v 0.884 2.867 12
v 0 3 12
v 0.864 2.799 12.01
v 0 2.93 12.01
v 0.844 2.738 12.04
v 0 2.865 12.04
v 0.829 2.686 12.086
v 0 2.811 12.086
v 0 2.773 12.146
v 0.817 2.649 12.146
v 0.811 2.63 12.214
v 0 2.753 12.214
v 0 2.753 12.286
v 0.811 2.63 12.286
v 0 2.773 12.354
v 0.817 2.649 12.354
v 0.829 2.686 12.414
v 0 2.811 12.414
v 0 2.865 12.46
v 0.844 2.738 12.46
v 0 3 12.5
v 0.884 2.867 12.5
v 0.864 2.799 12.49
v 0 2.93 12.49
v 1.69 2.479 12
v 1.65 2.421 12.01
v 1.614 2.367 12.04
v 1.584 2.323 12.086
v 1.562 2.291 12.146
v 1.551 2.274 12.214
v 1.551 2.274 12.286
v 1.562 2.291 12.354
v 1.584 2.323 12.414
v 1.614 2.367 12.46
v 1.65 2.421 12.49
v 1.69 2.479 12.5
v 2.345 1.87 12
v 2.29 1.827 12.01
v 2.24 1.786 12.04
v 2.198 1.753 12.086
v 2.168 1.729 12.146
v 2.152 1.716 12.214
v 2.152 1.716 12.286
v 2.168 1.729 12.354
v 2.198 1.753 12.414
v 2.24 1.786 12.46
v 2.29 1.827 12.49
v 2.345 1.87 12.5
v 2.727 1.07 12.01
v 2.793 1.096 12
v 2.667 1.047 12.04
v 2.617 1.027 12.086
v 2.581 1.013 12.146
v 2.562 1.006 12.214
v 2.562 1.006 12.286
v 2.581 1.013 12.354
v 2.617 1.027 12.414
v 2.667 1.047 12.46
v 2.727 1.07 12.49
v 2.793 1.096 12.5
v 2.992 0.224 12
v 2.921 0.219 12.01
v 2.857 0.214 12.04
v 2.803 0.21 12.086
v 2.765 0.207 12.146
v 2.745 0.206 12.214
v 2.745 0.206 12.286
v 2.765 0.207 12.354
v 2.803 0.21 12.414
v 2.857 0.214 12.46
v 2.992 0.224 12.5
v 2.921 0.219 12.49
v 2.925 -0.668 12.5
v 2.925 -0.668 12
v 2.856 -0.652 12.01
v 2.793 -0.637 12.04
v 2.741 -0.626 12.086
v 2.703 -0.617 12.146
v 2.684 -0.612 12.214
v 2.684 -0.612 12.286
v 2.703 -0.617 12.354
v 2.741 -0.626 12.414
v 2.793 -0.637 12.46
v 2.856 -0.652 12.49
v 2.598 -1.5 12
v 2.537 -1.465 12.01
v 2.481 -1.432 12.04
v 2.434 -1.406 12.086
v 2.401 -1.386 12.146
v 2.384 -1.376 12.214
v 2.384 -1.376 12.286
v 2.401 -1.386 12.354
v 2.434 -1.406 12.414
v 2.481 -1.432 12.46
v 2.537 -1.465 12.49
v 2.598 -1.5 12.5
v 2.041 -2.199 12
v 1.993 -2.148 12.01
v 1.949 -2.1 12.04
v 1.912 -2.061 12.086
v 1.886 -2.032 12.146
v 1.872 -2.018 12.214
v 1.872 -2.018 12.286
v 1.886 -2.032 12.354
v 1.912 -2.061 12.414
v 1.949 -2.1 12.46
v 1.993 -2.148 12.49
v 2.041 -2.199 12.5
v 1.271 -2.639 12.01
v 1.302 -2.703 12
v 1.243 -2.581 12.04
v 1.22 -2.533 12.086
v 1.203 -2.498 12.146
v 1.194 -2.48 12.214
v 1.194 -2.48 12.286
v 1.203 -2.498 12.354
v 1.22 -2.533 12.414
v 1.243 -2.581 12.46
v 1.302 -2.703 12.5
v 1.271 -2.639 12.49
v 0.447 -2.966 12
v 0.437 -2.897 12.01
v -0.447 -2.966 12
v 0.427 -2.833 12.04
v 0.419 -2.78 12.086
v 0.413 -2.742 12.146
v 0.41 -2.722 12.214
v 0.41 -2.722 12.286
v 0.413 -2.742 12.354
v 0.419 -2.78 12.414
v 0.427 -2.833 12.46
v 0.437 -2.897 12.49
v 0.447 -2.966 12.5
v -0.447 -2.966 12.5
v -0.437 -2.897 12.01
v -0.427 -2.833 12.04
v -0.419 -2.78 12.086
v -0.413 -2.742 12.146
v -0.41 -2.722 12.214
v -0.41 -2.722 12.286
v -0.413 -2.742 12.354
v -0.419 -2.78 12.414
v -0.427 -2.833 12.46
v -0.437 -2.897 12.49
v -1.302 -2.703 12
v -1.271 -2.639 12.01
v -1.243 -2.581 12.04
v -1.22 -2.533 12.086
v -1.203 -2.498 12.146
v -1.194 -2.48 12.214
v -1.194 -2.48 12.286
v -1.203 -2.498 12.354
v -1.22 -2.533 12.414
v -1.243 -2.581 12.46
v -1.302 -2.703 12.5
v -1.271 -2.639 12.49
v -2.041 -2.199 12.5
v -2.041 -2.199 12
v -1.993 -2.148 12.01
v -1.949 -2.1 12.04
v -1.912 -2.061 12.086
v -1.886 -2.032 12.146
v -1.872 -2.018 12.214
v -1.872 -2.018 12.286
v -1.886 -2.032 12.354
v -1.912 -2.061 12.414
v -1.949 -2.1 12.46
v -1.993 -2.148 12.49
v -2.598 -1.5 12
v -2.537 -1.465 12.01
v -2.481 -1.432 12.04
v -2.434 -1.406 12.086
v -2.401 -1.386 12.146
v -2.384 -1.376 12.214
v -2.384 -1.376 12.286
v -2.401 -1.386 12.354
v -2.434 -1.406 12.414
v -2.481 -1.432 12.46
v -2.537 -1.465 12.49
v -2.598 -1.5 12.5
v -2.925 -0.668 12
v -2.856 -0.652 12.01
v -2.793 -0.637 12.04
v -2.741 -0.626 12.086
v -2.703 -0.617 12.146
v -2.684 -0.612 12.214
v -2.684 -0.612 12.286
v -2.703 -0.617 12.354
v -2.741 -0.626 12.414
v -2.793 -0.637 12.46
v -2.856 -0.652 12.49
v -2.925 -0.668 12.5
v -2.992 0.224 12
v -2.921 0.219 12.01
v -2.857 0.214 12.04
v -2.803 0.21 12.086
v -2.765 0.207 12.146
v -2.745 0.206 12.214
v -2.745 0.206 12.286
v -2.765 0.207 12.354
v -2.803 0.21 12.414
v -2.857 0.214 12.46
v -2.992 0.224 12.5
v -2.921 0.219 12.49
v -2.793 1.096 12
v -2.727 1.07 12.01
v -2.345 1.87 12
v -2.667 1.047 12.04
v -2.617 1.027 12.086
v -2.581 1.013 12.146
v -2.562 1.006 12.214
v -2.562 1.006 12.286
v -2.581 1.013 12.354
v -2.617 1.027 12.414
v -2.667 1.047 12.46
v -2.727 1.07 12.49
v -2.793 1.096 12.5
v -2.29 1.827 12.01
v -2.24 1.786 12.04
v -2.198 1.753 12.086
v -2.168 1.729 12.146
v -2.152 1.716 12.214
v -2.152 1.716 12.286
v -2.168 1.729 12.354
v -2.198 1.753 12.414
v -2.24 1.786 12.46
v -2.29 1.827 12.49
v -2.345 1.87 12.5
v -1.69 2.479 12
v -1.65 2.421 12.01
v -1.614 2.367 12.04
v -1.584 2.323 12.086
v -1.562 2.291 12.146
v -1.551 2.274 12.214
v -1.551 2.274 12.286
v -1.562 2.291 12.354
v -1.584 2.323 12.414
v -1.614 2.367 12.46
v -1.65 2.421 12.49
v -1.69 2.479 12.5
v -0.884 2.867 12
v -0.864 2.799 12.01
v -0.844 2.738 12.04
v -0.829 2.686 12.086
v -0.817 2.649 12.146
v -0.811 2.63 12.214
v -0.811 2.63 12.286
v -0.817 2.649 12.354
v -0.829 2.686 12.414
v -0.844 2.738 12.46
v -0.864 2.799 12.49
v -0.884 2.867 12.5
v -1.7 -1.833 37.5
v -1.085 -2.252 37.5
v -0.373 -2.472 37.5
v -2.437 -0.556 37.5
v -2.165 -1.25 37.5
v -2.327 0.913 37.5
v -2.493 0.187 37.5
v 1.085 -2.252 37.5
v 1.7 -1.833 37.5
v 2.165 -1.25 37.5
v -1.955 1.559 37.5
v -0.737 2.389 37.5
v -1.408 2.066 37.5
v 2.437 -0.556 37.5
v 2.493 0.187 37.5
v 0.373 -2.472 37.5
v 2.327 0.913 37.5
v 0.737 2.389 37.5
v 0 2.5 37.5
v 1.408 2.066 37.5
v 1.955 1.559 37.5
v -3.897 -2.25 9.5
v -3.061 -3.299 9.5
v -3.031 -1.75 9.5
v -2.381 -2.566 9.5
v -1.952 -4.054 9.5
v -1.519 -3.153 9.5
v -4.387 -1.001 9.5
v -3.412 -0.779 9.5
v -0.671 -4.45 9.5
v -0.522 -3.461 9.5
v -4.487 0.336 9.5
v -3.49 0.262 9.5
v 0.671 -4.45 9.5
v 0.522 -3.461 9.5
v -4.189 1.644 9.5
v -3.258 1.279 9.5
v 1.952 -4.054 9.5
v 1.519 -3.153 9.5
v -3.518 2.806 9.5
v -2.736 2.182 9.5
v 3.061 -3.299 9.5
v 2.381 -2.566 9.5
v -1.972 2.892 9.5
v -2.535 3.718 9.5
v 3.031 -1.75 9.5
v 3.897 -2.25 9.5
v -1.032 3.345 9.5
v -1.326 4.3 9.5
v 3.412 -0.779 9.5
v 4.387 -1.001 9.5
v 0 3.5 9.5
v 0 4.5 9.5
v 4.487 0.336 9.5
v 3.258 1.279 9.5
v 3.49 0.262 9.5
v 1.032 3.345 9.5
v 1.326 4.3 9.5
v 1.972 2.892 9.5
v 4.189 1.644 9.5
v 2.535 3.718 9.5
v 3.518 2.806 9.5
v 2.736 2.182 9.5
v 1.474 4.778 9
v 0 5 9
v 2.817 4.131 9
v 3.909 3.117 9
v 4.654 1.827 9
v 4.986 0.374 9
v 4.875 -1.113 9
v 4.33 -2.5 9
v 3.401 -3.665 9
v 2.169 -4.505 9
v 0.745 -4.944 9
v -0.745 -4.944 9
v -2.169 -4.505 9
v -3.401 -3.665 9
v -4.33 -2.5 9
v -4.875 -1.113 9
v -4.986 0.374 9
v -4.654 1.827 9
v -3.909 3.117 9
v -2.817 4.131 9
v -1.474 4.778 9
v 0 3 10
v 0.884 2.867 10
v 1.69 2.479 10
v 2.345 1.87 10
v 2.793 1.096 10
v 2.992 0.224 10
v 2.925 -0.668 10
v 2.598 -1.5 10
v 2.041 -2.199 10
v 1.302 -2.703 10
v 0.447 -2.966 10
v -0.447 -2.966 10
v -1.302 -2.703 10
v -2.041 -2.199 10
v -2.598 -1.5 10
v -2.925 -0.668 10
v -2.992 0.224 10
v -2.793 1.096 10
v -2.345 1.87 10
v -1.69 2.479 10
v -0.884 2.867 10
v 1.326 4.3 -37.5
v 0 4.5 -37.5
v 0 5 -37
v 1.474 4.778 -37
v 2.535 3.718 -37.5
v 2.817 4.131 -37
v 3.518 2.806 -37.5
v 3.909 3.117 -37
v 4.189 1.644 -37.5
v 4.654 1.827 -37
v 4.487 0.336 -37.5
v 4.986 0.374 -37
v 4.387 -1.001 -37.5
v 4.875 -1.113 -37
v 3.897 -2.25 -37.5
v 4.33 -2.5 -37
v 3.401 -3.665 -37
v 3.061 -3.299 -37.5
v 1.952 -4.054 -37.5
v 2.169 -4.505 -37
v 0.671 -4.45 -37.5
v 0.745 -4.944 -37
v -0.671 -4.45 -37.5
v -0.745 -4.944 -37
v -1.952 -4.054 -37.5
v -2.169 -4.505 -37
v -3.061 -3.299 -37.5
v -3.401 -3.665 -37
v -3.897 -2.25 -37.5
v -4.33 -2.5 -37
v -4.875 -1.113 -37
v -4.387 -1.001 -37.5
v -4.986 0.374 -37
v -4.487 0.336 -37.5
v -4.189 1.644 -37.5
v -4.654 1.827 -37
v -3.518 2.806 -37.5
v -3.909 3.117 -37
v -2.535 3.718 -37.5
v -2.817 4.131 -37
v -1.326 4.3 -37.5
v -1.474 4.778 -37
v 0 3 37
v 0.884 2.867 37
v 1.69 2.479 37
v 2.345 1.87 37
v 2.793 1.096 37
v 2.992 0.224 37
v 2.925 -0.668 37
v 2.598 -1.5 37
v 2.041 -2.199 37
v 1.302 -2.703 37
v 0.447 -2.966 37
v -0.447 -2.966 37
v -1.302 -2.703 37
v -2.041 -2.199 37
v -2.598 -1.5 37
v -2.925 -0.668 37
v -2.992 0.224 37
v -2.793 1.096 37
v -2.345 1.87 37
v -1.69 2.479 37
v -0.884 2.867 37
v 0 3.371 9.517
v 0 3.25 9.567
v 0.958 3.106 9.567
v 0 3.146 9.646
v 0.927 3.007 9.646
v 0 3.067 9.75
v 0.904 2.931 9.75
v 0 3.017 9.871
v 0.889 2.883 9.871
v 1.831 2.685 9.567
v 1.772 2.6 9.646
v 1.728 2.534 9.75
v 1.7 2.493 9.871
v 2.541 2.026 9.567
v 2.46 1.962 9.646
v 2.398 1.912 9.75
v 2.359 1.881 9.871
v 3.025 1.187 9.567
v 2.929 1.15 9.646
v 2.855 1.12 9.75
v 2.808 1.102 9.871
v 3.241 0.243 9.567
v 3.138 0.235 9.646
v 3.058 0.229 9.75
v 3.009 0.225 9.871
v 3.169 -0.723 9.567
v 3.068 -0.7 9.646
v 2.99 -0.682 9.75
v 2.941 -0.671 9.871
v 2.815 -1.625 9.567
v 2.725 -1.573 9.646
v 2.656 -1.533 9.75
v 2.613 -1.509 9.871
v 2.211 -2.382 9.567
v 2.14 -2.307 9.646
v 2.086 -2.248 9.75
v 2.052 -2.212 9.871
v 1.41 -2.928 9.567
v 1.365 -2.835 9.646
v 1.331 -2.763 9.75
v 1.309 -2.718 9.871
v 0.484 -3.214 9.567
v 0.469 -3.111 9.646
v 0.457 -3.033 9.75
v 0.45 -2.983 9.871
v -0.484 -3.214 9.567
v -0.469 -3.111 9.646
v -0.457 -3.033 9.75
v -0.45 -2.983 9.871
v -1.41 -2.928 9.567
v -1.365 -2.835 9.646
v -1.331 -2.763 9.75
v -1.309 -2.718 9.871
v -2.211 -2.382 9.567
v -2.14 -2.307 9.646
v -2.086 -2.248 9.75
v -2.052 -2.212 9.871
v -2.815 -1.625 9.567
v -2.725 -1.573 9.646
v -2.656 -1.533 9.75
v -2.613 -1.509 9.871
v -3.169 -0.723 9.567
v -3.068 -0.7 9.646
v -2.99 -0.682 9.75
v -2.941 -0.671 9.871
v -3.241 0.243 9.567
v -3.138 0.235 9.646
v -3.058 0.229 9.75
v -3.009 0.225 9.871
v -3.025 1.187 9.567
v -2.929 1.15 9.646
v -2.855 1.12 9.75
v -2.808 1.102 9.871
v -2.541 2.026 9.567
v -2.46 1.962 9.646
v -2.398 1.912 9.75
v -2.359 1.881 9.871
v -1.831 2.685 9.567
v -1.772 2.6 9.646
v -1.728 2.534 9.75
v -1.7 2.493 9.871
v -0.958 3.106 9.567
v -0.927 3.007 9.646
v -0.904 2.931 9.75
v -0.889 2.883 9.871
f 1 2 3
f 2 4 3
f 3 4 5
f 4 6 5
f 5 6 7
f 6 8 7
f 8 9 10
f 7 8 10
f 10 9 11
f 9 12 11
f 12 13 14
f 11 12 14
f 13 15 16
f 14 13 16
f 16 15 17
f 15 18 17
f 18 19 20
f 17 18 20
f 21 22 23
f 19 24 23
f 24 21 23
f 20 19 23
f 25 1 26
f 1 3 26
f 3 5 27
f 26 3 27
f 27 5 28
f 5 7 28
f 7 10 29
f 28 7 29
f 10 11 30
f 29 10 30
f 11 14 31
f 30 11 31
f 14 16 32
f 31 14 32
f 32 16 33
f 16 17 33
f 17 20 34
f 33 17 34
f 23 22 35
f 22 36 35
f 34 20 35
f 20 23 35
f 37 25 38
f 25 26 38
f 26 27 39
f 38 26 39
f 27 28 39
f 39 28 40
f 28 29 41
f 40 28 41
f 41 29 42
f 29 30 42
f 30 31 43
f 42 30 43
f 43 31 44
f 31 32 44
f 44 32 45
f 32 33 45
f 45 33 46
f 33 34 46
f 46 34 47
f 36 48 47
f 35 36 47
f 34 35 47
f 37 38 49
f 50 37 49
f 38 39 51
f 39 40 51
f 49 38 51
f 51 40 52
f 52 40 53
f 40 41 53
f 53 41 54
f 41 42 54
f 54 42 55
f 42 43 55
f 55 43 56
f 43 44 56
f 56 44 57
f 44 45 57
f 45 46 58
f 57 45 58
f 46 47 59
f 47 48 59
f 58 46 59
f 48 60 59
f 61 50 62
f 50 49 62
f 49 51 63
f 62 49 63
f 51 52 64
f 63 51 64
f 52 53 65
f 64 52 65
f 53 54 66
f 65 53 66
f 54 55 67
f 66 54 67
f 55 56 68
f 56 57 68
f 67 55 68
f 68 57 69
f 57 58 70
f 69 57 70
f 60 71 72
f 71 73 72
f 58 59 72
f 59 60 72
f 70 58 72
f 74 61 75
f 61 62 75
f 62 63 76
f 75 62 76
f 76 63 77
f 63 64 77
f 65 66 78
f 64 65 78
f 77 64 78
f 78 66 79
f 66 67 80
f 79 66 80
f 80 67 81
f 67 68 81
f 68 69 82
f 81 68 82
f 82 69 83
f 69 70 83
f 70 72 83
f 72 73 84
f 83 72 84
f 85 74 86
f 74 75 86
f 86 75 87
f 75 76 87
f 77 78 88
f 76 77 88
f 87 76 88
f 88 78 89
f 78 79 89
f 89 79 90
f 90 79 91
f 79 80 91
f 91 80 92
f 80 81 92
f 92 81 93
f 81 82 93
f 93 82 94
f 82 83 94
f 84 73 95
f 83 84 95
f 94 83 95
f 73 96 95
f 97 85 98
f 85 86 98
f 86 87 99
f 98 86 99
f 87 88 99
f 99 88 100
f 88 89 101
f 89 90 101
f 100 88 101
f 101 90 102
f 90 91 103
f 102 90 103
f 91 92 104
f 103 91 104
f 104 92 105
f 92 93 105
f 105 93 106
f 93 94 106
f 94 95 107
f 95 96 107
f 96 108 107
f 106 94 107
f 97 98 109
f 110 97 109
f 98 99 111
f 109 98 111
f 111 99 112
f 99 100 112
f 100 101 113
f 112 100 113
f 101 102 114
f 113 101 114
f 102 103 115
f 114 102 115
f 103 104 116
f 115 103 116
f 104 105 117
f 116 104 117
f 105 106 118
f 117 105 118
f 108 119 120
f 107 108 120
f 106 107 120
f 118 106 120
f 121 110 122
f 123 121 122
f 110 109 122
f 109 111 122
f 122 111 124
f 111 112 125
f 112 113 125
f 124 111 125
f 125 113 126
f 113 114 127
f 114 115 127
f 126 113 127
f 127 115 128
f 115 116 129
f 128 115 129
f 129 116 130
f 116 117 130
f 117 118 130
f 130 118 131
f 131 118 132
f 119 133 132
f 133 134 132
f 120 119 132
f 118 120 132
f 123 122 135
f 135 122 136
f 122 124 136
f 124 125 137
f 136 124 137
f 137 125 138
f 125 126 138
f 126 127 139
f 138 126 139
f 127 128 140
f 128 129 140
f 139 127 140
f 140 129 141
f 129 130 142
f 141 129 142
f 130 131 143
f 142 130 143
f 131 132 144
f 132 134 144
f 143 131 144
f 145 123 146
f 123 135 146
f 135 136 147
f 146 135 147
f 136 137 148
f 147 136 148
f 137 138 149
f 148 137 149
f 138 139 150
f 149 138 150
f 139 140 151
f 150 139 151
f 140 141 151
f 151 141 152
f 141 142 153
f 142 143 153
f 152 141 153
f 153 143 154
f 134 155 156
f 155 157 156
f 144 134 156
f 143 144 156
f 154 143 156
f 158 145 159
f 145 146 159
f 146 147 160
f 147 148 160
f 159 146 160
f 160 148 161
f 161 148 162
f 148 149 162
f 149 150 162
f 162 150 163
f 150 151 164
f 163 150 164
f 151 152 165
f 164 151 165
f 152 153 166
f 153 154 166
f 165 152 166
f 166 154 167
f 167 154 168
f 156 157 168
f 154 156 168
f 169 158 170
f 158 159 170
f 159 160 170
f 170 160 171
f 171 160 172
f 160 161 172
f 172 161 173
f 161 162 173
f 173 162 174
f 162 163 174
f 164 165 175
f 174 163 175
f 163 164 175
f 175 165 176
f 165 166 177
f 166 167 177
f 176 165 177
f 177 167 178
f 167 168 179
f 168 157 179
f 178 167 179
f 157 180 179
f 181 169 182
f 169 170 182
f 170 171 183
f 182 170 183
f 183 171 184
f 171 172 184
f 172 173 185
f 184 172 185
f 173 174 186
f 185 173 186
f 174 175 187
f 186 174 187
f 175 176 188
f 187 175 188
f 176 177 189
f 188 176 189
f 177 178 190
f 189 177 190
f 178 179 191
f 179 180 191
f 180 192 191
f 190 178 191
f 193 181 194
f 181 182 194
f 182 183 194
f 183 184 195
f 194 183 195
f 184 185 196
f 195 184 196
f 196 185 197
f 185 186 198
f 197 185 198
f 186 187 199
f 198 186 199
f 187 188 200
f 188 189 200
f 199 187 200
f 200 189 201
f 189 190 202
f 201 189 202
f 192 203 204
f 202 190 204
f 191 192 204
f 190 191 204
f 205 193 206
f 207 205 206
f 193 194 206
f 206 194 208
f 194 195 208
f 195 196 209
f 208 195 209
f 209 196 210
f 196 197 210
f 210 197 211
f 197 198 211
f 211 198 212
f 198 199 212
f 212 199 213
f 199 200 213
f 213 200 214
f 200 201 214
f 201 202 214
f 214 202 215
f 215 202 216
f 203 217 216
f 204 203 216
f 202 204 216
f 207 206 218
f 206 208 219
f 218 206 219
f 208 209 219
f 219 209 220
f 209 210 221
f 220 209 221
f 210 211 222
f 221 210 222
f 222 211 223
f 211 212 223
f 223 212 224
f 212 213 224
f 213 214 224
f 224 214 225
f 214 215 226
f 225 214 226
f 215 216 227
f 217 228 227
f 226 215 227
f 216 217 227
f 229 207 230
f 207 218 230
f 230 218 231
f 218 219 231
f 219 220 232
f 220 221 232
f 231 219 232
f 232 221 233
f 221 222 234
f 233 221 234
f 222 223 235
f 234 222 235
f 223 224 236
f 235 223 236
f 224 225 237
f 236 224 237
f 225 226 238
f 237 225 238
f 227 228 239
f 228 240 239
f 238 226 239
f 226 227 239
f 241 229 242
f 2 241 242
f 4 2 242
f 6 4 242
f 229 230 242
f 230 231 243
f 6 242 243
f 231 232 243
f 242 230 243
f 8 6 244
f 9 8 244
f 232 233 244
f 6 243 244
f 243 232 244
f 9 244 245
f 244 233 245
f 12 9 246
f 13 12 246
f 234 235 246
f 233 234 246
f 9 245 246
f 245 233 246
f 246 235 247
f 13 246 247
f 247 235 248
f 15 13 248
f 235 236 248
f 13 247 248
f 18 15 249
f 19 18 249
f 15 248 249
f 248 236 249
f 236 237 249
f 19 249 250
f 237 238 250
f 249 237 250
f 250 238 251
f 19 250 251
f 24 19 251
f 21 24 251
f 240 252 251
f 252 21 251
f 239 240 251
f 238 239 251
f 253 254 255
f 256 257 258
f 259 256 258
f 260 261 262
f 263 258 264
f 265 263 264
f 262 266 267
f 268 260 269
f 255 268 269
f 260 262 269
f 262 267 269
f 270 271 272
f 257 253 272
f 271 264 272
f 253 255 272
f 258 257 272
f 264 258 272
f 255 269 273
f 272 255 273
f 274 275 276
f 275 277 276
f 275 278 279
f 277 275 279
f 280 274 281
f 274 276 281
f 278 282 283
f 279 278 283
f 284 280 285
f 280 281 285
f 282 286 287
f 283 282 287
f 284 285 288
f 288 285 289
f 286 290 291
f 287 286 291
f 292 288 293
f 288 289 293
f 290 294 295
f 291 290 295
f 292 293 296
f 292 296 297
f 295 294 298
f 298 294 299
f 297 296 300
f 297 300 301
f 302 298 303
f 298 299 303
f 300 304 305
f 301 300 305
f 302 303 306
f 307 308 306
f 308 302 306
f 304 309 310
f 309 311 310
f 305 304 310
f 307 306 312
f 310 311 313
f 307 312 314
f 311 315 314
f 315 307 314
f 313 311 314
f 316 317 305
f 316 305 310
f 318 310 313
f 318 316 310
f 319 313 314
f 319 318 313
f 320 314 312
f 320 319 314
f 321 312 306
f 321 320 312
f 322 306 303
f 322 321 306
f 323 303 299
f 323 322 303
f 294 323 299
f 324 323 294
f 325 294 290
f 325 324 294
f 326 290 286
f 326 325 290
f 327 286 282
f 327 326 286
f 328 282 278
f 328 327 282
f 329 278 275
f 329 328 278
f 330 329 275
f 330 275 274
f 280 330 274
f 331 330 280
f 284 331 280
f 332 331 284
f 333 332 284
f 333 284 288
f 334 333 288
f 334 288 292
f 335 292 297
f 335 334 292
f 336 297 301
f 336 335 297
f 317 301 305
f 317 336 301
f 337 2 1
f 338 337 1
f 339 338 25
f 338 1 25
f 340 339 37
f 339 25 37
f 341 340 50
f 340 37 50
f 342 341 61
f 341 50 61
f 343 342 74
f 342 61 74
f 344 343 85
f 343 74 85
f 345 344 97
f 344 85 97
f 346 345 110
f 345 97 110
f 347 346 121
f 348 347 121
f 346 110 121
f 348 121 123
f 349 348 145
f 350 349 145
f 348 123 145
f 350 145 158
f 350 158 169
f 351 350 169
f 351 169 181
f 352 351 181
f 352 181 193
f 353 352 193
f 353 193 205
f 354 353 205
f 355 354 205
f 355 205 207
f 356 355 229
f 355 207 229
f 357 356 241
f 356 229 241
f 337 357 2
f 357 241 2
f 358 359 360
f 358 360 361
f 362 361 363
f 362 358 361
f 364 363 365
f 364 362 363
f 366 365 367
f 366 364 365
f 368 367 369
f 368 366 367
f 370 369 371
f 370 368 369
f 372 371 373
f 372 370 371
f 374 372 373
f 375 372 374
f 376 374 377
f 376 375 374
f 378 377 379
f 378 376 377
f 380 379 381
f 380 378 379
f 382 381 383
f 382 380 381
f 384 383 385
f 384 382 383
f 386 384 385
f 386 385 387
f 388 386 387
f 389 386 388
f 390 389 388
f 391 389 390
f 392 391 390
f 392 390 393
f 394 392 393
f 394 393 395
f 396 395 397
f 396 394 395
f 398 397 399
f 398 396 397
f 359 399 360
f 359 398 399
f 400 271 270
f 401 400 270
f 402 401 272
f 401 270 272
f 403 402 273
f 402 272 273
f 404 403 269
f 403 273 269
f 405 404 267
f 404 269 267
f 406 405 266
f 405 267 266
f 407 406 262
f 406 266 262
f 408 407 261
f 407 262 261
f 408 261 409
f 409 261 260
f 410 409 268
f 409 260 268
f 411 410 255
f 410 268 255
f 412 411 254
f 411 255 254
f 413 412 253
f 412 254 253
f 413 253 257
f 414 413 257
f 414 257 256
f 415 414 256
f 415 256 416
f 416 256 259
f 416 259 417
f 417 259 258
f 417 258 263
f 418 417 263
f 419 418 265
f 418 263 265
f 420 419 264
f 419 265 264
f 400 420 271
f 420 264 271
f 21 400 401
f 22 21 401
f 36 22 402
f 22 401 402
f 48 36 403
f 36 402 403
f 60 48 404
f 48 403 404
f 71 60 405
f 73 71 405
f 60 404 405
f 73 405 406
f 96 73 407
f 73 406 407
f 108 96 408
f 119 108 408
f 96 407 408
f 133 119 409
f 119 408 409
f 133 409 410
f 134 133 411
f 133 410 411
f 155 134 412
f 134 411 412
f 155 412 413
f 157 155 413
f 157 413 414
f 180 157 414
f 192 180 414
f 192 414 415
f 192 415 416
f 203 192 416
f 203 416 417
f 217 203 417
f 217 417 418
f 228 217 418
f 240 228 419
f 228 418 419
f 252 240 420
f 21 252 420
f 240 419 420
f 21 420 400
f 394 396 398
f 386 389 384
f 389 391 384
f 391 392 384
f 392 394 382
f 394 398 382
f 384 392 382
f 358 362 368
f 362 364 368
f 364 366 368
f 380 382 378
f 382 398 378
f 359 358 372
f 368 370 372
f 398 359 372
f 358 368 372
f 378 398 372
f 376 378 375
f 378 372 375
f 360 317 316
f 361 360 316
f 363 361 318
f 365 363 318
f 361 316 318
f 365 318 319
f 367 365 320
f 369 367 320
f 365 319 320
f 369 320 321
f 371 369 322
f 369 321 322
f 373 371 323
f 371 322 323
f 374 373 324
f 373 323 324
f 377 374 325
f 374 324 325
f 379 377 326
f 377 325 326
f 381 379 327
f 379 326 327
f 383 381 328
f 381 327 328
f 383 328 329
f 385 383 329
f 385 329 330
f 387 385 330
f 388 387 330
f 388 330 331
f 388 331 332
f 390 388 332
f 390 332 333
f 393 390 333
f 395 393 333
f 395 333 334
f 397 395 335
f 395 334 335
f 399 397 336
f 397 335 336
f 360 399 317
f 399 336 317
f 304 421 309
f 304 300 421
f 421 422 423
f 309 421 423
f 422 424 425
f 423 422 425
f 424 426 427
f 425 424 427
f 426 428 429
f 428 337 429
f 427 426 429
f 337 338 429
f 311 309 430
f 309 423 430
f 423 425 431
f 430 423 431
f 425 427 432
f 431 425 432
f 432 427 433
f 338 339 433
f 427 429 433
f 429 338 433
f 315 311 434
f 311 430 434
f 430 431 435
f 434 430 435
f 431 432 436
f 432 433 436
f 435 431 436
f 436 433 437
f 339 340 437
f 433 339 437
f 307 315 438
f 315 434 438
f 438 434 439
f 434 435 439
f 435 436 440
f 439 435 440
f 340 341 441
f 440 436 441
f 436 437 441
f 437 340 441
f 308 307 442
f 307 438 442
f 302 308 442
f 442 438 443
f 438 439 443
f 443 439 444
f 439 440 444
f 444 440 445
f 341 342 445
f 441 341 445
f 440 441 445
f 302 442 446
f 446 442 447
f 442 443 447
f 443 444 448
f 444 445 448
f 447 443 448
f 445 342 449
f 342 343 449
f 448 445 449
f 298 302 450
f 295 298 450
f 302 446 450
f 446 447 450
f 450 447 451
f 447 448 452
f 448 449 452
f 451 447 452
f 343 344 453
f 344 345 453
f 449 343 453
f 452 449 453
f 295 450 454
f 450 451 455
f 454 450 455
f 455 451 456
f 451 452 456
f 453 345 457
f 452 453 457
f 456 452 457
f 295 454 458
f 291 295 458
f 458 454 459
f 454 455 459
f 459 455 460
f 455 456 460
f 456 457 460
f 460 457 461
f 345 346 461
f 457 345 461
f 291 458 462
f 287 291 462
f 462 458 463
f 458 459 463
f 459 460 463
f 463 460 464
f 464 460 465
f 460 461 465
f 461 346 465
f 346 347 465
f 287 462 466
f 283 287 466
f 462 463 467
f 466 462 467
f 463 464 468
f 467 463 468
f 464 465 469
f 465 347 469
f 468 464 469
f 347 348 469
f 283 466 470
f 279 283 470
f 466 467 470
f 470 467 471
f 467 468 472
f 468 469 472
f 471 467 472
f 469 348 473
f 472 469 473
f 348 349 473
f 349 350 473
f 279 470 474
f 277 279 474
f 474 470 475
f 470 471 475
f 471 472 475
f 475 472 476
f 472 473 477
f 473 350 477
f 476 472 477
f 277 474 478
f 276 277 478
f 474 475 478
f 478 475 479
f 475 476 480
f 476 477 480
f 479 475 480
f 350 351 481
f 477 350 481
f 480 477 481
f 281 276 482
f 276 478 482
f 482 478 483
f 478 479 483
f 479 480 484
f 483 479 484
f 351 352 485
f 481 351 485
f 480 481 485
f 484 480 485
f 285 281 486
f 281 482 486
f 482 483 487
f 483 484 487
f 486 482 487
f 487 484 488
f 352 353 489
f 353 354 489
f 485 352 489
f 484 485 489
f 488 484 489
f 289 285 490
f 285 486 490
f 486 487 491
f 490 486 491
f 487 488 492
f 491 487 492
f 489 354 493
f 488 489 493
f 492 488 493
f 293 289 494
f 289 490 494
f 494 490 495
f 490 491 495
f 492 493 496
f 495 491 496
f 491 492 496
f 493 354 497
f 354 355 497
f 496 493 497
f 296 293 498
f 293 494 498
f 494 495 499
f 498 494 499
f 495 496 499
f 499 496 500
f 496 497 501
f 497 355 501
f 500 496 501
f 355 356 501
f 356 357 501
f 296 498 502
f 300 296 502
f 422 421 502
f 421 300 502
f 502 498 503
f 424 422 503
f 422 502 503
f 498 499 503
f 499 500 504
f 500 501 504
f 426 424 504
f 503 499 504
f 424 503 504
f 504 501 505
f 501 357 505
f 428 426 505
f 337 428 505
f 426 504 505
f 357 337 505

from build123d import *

# Parameters (mm, degrees)
FILLET1_R     = 0.5
CHAMFER1_SIZE = 0.5


with BuildPart() as part:
    # Sketch1 → Revolve1 (revolve)
    with BuildSketch(Plane(origin=(0, 0, 0), x_dir=(0, 0, -1), z_dir=(1, 0, 0))):
        with BuildLine():
            Line((-37.5, 0), (37.5, 0))
            Line((37.5, 0), (37.5, 5))
            Line((37.5, 5), (-9.5, 5))
            Line((-9.5, 5), (-9.5, 3))
            Line((-9.5, 3), (-12, 3))
            ThreePointArc((-12, 3), (-12.25, 2.75), (-12.5, 3))
            Line((-12.5, 3), (-37.5, 3))
            Line((-37.5, 3), (-37.5, 0))
        make_face()
    revolve(axis=Axis((0, 0, 258.883884114), (0, 0, -1)))

    # Fillet1
    fillet1_edges = [part.edges().sort_by_distance(p)[0] for p in [
        (0, -3, 9.5),
    ]]
    fillet(fillet1_edges, radius=FILLET1_R)

    # Chamfer1
    chamfer1_edges = [part.edges().sort_by_distance(p)[0] for p in [
        (0, -5, -37.5),
        (0, -3, 37.5),
        (0, -5, 9.5),
    ]]
    chamfer(chamfer1_edges, length=CHAMFER1_SIZE)


solid = part.part
